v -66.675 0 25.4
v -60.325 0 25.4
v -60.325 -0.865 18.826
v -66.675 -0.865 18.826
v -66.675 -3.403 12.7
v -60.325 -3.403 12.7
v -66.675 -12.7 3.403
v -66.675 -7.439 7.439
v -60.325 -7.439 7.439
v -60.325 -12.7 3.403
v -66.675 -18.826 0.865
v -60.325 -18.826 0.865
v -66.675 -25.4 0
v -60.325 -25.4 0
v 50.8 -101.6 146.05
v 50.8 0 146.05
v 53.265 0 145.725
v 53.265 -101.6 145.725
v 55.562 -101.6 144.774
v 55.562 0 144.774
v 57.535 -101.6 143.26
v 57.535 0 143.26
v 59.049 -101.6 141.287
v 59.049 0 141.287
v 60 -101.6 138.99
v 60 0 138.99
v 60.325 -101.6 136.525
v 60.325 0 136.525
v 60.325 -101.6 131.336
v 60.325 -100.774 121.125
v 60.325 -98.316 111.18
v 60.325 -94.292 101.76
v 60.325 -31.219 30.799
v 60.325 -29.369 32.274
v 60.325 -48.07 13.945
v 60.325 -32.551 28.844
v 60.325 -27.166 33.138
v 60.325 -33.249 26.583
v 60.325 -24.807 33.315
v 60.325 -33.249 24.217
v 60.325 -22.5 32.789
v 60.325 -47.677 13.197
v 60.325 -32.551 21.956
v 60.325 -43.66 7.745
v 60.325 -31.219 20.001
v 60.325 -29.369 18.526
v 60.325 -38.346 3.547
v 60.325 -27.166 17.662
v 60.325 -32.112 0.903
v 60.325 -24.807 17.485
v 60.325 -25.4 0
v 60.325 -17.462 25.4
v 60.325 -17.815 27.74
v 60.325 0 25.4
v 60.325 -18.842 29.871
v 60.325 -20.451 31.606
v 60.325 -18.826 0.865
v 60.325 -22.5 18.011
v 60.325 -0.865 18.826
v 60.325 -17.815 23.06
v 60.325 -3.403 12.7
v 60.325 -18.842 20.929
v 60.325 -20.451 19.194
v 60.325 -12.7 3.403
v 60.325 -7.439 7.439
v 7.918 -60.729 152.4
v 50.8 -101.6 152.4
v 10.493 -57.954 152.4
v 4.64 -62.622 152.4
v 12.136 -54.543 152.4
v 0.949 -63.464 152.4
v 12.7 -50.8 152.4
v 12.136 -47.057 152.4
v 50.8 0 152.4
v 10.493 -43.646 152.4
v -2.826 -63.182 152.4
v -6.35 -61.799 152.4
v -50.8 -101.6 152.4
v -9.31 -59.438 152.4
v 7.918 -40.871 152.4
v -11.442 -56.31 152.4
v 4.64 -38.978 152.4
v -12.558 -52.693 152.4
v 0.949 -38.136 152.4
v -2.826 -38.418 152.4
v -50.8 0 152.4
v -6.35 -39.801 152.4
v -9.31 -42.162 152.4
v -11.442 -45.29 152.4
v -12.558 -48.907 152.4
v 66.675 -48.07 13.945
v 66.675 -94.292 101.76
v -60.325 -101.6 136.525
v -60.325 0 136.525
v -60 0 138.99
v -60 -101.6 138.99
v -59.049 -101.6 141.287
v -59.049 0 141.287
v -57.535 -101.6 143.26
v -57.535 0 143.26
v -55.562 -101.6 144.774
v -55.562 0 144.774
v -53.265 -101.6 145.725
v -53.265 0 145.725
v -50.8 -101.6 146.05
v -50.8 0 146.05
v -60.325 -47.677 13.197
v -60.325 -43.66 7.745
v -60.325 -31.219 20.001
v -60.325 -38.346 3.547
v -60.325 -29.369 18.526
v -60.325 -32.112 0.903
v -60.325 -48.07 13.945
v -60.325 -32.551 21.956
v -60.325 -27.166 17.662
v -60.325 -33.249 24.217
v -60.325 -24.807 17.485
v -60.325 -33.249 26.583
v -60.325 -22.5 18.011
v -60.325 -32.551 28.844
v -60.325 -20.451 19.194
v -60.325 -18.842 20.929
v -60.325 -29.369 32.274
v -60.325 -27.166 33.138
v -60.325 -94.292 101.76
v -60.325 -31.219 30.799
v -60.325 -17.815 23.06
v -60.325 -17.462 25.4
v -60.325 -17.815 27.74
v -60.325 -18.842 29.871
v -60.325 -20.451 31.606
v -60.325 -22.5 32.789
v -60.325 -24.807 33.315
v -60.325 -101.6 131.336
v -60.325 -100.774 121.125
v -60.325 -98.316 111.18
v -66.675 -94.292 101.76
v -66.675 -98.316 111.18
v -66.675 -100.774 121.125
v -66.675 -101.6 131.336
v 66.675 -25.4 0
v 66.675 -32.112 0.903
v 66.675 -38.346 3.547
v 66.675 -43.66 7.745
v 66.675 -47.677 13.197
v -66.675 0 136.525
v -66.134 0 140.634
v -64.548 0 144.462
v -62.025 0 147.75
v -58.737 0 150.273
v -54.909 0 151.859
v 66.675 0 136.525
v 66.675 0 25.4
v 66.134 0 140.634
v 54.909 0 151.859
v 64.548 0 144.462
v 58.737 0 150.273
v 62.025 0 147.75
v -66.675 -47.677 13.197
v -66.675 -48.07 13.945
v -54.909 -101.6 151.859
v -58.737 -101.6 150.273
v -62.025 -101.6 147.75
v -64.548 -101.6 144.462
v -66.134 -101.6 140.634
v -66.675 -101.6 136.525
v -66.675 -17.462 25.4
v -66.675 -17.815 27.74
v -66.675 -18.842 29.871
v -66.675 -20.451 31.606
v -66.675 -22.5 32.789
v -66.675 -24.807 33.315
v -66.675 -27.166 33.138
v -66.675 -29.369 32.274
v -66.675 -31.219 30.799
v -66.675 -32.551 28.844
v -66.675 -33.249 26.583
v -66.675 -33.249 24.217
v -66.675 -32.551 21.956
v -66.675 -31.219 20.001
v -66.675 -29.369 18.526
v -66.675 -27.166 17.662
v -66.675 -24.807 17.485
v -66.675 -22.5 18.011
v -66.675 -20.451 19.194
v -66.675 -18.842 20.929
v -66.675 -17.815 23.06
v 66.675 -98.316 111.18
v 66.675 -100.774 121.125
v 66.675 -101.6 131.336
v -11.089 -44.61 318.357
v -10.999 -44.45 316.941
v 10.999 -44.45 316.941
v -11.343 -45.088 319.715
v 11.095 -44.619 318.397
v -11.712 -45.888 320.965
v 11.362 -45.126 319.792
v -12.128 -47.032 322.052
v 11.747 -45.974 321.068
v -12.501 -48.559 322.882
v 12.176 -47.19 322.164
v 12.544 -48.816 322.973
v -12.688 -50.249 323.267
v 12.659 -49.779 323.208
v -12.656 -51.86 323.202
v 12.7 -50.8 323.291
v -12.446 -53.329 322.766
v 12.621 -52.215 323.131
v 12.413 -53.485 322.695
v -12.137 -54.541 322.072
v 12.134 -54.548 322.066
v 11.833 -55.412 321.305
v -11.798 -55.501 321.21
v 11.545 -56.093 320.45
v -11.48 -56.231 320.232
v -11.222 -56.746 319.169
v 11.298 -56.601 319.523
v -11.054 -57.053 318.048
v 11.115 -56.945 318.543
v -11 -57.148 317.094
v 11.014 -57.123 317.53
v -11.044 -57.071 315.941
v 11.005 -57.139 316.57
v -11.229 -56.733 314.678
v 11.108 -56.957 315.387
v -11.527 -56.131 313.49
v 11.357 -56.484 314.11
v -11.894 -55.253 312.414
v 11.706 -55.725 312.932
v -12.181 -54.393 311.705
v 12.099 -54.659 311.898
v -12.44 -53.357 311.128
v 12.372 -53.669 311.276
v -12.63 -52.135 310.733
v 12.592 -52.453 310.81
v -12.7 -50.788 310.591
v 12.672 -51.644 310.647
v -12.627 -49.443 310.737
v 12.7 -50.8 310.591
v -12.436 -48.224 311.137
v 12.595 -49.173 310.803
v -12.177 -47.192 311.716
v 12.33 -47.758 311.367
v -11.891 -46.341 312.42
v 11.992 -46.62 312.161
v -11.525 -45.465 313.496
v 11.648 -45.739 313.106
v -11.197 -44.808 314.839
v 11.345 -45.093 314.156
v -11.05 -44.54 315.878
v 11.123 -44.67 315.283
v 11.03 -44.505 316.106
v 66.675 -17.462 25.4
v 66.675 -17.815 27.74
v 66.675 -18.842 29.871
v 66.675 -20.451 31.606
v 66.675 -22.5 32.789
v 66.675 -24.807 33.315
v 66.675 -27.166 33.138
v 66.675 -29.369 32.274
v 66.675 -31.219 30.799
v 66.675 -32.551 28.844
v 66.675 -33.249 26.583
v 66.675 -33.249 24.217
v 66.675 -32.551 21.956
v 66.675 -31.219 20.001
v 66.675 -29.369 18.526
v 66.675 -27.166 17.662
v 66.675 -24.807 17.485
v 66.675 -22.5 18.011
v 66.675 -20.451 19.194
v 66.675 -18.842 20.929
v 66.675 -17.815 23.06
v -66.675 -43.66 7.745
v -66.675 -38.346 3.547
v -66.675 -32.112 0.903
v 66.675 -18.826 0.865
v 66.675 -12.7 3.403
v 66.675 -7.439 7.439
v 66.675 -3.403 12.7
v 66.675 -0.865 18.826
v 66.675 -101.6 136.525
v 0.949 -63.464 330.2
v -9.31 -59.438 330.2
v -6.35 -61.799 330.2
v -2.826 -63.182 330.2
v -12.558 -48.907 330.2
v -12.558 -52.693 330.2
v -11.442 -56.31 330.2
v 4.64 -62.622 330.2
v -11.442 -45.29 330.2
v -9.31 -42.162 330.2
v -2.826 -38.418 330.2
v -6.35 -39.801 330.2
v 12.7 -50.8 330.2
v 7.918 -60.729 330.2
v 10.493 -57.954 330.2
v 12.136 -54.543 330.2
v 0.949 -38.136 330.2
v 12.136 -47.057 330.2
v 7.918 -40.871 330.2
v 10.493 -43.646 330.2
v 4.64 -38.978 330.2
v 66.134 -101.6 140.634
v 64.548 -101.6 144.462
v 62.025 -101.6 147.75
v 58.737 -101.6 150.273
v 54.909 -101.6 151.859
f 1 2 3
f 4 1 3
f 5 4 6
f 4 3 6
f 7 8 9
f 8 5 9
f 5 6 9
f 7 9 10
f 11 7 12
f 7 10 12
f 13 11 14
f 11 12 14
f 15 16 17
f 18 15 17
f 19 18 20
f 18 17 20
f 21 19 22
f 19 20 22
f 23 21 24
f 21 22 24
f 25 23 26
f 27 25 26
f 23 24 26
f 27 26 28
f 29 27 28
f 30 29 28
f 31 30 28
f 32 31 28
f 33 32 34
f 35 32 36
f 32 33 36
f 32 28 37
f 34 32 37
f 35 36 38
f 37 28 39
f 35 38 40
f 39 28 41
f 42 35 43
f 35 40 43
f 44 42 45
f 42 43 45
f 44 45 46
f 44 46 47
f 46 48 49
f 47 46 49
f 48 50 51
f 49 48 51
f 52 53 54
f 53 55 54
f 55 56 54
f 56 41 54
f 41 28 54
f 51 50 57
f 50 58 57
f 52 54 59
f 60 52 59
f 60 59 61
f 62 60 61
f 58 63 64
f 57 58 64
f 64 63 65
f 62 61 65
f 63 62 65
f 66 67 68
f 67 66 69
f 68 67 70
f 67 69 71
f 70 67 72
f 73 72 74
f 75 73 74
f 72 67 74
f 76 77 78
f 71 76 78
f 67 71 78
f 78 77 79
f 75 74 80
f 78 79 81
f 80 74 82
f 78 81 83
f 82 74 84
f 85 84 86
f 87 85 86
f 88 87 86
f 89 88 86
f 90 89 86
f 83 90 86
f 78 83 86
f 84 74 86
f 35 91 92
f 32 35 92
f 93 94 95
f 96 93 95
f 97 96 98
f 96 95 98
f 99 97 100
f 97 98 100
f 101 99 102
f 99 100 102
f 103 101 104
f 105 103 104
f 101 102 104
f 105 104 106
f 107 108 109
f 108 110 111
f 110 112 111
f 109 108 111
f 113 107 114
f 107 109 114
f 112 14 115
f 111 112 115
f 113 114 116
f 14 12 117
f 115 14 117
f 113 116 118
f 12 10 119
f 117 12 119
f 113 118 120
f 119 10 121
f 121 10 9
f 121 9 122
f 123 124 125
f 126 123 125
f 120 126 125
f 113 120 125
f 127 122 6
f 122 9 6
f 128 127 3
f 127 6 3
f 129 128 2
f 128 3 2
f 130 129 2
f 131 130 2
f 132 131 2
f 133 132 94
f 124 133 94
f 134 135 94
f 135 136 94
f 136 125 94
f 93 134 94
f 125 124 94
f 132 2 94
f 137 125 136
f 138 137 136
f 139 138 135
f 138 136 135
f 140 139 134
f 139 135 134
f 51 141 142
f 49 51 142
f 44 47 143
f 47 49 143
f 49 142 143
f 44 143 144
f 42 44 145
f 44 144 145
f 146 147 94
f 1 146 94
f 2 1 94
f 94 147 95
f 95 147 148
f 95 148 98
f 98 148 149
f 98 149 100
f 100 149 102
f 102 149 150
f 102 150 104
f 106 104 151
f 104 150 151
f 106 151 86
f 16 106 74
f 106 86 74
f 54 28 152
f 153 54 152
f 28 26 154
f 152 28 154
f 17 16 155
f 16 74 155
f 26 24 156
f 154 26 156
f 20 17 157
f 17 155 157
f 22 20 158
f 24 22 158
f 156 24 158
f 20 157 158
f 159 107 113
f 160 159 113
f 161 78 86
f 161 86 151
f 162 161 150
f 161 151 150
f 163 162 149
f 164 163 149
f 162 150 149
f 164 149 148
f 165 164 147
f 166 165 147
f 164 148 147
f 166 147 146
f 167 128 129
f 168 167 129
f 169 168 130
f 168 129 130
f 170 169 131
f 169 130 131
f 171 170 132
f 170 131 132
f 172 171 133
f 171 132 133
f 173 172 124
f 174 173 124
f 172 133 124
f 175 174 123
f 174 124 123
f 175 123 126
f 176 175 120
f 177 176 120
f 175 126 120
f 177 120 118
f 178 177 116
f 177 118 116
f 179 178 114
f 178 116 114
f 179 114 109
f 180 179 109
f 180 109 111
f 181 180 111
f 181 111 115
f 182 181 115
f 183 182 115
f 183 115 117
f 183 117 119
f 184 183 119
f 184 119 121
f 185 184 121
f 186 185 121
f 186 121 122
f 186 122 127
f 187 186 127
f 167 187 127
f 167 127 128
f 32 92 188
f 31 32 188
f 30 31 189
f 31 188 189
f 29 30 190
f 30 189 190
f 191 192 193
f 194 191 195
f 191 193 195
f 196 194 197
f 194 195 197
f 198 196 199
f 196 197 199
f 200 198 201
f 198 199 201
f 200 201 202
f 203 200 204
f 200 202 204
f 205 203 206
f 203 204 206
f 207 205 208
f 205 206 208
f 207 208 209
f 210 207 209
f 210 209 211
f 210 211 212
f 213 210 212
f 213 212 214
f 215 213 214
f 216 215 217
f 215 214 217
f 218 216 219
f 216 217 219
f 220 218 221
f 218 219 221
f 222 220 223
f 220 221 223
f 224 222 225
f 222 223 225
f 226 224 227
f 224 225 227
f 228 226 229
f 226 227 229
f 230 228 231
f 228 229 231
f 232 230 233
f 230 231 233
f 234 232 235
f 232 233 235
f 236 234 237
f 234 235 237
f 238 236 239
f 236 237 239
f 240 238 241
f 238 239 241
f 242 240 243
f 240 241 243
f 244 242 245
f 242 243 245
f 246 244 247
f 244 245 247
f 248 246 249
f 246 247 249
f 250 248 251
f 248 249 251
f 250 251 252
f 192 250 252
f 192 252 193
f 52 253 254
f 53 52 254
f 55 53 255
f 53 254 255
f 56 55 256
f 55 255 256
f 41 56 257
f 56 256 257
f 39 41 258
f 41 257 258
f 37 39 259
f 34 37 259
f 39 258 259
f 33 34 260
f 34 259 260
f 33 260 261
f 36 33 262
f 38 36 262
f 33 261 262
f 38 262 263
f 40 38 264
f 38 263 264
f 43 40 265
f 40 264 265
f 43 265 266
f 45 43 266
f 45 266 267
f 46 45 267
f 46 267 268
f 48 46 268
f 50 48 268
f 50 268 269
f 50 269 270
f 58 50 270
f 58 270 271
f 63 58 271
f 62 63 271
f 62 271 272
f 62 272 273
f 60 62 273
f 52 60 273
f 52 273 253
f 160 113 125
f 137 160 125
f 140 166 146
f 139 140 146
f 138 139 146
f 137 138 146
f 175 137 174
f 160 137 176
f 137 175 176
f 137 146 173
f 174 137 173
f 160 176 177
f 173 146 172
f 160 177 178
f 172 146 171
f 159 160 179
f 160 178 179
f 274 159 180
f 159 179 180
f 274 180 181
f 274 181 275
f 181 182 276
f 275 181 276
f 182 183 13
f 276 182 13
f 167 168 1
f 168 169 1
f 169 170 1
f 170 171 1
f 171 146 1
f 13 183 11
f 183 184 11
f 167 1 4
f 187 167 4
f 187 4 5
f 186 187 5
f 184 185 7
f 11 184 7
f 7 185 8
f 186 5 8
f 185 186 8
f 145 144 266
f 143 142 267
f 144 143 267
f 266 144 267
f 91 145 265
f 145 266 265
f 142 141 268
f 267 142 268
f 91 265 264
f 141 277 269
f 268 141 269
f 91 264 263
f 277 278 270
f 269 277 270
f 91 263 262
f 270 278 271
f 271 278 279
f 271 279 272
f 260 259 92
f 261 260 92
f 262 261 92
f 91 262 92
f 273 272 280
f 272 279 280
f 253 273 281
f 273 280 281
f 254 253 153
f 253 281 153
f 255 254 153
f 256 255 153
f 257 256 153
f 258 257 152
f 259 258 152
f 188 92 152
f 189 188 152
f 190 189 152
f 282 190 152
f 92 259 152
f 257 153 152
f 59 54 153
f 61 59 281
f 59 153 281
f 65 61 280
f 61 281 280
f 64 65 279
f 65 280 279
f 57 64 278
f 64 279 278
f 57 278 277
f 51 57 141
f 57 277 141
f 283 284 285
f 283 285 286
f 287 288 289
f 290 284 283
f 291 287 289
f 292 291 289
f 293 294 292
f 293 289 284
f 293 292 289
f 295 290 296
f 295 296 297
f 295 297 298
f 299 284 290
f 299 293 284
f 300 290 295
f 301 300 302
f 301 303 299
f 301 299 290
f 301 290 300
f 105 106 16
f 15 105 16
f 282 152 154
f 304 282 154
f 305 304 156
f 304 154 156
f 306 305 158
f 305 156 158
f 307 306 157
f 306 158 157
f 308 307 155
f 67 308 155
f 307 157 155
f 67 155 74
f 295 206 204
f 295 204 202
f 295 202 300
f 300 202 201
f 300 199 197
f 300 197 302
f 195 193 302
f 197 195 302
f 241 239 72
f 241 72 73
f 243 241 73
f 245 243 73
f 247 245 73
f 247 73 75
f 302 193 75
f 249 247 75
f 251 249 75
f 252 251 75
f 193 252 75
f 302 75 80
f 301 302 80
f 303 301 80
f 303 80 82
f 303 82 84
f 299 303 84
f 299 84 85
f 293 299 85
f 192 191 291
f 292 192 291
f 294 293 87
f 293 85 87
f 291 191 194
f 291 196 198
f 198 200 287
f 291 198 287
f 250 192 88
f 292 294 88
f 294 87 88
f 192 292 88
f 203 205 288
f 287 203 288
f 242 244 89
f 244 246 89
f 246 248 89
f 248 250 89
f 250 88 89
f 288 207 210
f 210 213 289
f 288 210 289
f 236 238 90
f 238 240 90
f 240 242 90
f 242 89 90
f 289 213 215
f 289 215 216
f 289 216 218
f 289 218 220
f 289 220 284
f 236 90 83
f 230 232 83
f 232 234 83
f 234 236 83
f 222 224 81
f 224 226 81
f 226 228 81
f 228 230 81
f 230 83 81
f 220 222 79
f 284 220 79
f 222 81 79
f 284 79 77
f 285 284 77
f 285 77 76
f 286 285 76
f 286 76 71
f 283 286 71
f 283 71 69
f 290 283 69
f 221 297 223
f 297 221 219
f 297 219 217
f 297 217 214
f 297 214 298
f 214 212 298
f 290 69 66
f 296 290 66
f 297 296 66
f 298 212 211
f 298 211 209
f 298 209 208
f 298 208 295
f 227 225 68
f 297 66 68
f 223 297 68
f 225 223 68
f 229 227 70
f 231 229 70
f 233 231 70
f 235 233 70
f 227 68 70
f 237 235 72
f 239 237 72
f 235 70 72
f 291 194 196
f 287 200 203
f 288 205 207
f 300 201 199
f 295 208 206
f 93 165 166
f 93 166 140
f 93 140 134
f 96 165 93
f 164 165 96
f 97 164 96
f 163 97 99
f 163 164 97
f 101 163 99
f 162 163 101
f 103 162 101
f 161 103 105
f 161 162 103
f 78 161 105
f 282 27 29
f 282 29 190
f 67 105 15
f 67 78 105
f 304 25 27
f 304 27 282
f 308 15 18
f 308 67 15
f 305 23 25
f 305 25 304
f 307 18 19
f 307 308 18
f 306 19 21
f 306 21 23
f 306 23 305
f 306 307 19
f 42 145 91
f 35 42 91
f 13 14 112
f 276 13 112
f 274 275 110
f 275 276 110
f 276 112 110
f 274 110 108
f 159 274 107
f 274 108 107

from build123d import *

# Parameters (mm, degrees)
F1_DEPTH = 101.6
F2_R     = 12.7
F3_DEPTH = 177.8
F4_R     = 7.9375
F4_R_2   = 6.35
F5_DEPTH = 177.8


with BuildPart() as f1:
    # F0 (on Front) → F1 (new body)
    with BuildSketch(Plane.XZ):
        with BuildLine():
            Line((-66.675, 136.525), (-66.675, 0))
            Line((-66.675, 0), (-60.325, 0))
            Line((-60.325, 0), (-60.325, 136.525))
            ThreePointArc((-60.325, 136.525), (-57.535192, 143.260192), (-50.8, 146.05))
            Line((-50.8, 146.05), (50.8, 146.05))
            ThreePointArc((50.8, 146.05), (57.535192, 143.260192), (60.325, 136.525))
            Line((60.325, 136.525), (60.325, 0))
            Line((60.325, 0), (66.675, 0))
            Line((66.675, 0), (66.675, 136.525))
            ThreePointArc((66.675, 136.525), (62.02532, 147.75032), (50.8, 152.4))
            Line((50.8, 152.4), (-50.8, 152.4))
            ThreePointArc((-50.8, 152.4), (-62.02532, 147.75032), (-66.675, 136.525))
        make_face()
    extrude(amount=F1_DEPTH)

    # F2 (on face) → F3 (join)
    with BuildSketch(Plane.XY.offset(152.4)):
        with Locations((0, -50.8)):
            Circle(F2_R)
    extrude(amount=F3_DEPTH)

    # F4 (on face) → F5 (cut)
    with BuildSketch(Plane.YZ.offset(66.675)):
        with BuildLine():
            Line((-101.6, 131.336227), (-101.6, 0))
            Line((-101.6, 0), (-25.4, 0))
            ThreePointArc((-25.4, 0), (-38.346191, 3.546942), (-47.676682, 13.197154))
            ThreePointArc((-47.676682, 13.197154), (-47.876619, 13.569464), (-48.070335, 13.945048))
            Line((-48.070335, 13.945048), (-94.291548, 101.759887))
            ThreePointArc((-94.291548, 101.759887), (-99.745816, 116.103258), (-101.6, 131.336227))
        make_face()
        with BuildLine():
            ThreePointArc((-48.070335, 13.945048), (-47.876619, 13.569464), (-47.676682, 13.197154))
            Line((-47.676682, 13.197154), (-48.070335, 13.945048))
        make_face()
        with Locations((-25.4, 25.4)):
            Circle(F4_R)
        with Locations((-50.8, 316.940695)):
            Circle(F4_R_2)
        with BuildLine():
            ThreePointArc((0, 25.4), (-7.439488, 7.439488), (-25.4, 0))
            Line((-25.4, 0), (0, 0))
            Line((0, 0), (0, 25.4))
        make_face()
    extrude(amount=-F5_DEPTH, mode=Mode.SUBTRACT)


solid = f1.part
